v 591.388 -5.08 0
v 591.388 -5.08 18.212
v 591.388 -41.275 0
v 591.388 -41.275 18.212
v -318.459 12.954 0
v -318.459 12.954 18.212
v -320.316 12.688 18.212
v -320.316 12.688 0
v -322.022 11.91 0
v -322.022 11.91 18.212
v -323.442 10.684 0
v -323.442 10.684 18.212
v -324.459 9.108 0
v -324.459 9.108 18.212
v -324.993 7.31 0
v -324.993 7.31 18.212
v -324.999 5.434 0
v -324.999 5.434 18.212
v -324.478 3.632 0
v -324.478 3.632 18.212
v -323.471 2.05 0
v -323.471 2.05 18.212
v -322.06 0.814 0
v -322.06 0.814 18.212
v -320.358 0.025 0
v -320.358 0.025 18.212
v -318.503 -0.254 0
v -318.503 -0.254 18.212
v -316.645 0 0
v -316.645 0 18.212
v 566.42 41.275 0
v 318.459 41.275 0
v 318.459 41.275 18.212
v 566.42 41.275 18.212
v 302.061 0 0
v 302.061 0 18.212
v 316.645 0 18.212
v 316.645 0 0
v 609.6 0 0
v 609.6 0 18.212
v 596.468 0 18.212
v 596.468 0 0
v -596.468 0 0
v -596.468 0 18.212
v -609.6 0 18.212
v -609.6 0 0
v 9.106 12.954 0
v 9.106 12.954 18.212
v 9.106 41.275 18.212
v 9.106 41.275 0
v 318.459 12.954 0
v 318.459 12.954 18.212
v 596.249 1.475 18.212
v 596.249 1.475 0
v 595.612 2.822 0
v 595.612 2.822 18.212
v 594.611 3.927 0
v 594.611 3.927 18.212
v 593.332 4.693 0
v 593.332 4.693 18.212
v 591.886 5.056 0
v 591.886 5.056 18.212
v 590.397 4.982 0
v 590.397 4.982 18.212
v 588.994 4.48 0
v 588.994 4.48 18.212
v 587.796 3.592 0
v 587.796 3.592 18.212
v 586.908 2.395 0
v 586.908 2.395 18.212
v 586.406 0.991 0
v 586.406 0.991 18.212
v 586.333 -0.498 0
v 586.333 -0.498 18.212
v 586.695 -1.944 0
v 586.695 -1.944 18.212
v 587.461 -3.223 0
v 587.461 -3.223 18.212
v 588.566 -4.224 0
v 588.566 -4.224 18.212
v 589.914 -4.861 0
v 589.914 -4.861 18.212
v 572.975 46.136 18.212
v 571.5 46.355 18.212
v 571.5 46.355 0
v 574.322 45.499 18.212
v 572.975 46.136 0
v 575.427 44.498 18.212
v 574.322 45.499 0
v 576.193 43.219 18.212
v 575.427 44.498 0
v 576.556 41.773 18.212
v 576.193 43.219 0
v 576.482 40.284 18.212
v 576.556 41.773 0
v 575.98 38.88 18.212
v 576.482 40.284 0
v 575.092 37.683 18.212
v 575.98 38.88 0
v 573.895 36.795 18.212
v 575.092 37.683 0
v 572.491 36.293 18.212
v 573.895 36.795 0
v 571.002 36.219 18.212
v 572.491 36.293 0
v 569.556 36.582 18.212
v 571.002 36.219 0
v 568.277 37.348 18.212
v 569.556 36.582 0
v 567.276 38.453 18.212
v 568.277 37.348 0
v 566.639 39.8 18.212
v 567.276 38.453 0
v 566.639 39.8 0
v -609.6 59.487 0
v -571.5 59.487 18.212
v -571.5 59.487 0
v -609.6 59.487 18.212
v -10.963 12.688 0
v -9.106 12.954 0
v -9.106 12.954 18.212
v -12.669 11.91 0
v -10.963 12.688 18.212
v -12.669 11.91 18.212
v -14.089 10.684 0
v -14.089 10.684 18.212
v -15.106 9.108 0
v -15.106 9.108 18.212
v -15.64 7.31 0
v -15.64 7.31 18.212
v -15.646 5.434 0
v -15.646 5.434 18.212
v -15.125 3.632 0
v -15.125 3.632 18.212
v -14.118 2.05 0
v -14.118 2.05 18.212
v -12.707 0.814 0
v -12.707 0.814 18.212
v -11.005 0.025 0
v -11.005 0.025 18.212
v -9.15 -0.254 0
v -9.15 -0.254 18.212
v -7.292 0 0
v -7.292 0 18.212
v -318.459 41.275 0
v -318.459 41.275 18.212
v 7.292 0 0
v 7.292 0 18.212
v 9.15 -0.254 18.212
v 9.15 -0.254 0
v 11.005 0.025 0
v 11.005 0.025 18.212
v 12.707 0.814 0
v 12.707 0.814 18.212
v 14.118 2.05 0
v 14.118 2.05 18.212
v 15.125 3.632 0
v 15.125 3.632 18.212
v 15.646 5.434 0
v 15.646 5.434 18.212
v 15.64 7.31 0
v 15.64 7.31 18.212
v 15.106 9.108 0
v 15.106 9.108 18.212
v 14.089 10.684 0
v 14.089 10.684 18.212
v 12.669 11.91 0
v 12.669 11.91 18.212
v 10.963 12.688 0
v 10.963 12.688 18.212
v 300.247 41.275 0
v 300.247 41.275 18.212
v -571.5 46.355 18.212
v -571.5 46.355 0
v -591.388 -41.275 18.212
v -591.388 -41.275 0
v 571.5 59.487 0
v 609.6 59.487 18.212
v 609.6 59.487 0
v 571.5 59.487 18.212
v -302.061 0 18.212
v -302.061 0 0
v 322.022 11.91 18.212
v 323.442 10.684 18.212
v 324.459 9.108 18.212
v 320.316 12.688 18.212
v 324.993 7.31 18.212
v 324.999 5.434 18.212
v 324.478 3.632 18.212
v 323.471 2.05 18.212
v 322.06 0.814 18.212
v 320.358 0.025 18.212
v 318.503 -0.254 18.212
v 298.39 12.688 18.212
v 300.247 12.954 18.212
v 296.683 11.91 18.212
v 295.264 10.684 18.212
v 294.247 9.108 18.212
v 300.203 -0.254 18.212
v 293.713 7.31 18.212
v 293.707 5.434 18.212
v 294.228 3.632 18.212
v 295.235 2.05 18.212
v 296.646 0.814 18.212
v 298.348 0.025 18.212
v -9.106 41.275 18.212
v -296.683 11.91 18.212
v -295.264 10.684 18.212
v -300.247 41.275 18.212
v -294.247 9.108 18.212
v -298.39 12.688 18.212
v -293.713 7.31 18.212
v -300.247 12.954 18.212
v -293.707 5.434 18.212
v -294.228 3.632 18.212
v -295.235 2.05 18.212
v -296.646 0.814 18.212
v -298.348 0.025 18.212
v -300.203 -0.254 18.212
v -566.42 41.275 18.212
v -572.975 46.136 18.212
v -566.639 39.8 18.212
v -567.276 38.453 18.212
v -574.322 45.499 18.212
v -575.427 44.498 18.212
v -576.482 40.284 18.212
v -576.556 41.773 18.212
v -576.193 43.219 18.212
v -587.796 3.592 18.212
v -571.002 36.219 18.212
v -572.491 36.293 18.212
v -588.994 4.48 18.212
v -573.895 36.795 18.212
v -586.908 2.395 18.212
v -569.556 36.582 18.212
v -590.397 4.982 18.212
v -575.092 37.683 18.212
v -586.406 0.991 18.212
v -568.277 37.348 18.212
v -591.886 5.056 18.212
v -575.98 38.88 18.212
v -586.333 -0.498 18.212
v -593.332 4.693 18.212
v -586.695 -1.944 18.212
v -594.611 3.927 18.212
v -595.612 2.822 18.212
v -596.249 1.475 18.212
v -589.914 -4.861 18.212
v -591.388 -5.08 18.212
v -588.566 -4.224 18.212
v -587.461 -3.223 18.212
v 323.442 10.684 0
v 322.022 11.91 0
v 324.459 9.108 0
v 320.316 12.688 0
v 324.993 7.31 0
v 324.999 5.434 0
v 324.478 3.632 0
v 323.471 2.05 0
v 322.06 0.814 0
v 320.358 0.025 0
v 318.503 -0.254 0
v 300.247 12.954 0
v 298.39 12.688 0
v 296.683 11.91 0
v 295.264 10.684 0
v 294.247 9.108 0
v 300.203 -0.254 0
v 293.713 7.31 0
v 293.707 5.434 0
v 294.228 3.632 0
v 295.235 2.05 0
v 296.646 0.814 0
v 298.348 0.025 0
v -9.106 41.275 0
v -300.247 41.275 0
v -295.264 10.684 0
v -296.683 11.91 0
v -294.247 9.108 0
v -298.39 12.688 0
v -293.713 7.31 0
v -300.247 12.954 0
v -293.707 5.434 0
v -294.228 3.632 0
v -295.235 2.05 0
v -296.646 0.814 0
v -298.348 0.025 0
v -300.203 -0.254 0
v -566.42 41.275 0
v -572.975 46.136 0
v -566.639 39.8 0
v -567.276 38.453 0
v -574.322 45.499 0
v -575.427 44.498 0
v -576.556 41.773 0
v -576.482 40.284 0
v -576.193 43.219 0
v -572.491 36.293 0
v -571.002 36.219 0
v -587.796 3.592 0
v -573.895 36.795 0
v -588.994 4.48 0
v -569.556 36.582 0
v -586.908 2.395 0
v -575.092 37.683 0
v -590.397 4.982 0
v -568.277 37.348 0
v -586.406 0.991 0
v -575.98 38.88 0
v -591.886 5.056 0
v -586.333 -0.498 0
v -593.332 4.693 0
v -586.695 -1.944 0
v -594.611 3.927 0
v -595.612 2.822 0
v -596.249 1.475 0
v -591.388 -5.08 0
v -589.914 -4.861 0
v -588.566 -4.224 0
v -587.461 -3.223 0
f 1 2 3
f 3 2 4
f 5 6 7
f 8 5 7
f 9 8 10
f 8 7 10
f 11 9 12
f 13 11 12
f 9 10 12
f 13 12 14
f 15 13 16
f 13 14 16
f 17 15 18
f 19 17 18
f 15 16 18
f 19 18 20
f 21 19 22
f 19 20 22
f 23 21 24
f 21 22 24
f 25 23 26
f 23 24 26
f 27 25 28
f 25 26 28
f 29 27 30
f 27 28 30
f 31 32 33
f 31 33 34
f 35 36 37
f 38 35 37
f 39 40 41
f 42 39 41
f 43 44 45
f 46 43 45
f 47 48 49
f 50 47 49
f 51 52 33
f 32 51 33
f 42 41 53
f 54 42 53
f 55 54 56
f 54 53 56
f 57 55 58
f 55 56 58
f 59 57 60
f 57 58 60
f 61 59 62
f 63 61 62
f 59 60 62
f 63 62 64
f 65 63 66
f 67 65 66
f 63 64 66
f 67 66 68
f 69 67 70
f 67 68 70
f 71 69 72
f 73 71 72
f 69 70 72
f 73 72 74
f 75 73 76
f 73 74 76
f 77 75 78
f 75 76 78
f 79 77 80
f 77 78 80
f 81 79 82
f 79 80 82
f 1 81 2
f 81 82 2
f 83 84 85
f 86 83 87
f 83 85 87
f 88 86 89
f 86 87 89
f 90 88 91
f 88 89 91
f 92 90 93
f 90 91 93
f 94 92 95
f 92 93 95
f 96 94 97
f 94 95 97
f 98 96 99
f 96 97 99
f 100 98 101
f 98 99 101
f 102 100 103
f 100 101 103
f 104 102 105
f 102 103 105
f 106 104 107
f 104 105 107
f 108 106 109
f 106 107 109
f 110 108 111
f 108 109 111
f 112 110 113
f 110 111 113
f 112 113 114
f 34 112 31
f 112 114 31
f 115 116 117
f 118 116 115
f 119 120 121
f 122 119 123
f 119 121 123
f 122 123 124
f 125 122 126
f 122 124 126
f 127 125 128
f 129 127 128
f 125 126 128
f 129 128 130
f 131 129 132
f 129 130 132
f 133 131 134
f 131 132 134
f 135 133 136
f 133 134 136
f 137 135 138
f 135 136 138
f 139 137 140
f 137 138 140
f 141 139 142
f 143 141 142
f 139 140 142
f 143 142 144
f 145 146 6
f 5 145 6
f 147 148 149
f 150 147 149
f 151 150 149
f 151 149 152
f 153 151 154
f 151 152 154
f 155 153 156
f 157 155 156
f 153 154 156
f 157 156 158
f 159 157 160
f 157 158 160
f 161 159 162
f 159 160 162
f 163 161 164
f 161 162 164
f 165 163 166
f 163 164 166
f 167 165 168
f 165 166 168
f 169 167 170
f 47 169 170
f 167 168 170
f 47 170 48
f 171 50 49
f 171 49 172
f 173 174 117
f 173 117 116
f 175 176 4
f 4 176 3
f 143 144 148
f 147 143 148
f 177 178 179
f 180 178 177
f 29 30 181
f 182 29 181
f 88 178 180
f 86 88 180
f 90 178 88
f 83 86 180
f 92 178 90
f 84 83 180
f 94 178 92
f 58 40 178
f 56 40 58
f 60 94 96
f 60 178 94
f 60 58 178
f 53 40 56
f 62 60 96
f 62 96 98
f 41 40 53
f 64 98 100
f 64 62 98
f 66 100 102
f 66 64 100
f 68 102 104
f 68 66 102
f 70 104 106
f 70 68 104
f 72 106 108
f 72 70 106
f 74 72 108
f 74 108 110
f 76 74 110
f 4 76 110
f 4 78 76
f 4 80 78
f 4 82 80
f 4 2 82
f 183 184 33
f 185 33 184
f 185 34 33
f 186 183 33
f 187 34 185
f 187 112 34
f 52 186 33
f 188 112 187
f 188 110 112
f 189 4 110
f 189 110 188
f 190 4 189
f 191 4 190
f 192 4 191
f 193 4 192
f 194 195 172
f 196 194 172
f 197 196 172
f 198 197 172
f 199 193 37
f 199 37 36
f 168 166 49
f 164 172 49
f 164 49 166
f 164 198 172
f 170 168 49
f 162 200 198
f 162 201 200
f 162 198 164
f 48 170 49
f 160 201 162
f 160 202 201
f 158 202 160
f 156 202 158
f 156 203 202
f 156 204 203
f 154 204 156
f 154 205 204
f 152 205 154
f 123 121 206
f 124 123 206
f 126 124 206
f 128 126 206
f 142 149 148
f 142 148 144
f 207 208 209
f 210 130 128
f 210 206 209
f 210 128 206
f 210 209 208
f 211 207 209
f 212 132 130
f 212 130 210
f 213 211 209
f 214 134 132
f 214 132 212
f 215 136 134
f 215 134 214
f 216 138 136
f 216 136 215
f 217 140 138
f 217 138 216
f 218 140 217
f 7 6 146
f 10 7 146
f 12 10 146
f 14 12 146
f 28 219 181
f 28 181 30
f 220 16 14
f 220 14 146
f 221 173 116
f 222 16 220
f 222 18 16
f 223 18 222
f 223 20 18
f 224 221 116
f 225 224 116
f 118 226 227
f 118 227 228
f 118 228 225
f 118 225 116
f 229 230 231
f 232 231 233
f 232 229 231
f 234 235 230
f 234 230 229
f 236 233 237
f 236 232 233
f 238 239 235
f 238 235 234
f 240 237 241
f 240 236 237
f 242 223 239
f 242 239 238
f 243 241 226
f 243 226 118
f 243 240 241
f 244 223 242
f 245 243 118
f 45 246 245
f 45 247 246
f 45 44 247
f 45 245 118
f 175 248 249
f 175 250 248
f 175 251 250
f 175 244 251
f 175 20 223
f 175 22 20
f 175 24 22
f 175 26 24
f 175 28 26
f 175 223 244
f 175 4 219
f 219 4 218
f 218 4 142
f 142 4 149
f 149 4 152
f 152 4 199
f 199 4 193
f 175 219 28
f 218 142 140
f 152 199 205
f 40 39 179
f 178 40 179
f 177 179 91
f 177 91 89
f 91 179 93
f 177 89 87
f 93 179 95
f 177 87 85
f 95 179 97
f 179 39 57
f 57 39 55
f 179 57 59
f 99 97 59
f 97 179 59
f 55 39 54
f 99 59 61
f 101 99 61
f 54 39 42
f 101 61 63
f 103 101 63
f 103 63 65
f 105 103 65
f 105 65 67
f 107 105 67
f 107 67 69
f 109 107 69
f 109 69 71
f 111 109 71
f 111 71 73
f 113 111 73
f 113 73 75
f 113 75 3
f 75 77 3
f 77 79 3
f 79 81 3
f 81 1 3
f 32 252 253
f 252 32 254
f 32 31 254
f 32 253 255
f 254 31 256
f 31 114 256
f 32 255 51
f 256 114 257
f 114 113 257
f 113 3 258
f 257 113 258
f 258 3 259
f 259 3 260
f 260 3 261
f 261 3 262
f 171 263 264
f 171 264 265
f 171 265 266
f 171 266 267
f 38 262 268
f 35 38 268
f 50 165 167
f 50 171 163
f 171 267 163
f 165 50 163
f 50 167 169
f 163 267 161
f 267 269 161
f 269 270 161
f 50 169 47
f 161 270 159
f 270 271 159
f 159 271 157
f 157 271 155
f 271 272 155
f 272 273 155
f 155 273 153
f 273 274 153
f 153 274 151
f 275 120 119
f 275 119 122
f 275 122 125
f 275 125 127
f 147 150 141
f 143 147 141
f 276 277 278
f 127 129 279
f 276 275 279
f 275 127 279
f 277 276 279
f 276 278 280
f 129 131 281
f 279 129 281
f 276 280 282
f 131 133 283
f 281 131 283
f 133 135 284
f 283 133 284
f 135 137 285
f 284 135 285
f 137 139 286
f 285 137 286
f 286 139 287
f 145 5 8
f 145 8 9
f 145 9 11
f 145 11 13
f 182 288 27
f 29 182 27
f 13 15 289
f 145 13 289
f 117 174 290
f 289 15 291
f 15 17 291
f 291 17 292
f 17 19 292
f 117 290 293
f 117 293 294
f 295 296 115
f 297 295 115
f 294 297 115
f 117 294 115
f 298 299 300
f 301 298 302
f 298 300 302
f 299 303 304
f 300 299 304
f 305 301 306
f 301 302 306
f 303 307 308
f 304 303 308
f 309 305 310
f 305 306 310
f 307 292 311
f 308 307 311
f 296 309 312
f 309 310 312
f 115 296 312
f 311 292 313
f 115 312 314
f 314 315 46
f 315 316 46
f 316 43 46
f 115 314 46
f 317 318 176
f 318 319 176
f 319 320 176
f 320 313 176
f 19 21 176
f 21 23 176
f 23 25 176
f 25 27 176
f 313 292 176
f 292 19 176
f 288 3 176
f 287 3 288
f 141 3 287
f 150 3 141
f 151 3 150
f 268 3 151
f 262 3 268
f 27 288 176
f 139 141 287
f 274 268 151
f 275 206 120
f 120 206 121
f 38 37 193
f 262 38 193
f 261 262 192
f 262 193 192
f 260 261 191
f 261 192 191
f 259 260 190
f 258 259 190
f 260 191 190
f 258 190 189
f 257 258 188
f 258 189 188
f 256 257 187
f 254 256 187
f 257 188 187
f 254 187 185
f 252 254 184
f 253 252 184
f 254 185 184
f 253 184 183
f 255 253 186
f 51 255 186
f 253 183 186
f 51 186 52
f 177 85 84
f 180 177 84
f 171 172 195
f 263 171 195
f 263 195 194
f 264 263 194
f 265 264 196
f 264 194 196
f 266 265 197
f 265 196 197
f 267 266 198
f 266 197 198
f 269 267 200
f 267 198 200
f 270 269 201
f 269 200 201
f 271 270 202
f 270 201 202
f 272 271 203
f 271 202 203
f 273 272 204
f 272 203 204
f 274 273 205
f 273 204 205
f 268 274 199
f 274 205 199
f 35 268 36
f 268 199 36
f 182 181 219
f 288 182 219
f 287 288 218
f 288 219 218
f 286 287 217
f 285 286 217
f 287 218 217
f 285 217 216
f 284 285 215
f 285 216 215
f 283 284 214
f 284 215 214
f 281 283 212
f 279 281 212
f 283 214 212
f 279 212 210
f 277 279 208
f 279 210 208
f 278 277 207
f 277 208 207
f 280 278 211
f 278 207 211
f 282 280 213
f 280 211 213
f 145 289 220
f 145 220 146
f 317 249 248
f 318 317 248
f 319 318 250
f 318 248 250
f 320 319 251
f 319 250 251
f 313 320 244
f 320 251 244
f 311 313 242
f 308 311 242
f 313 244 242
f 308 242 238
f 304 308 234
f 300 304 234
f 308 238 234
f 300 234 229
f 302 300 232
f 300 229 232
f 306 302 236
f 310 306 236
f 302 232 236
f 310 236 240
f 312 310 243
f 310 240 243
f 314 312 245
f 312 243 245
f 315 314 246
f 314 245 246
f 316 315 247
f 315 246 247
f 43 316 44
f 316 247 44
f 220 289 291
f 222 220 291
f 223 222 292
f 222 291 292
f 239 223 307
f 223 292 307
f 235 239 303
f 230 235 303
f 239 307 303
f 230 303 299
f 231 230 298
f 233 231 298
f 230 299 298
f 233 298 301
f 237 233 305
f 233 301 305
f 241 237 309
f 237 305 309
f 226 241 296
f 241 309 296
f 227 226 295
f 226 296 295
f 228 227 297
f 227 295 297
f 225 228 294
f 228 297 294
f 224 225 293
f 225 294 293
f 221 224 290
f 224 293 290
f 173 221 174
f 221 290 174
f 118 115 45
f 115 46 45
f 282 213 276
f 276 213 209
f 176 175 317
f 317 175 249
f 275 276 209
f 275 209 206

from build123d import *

# Parameters (mm, degrees)
F1_W      = 1219.2
F1_H      = 82.55
F2_DEPTH  = 18.2118
F4_DEPTH  = 18.2128
F6_DEPTH  = 18.2128
F7_W      = 38.1
F7_H      = 18.2118
F8_DEPTH  = 18.2118
F9_R      = 5.08
F10_DEPTH = 18.2128


# Not quite as in the source:
# - a variable given as a bare number and used for a length is read in inches; the dataset says mm whatever the document's units were


with BuildPart() as f2:
    # F1 (on Top) → F2 (new body)
    with BuildSketch(Plane.XY):
        Rectangle(F1_W, F1_H)
    extrude(amount=F2_DEPTH)

    # F3 (on face) → F4 (cut, through all)
    with BuildSketch(Plane.XY.offset(18.2118)):
        Polygon((-609.6, 0), (-609.6, -41.275), (-591.3882, -41.275), (-591.3882, -5.08), (-591.3882, 0), (-596.4682, 0), align=None)
        with BuildLine():
            Line((-591.3882, 0), (-591.3882, -5.08))
            ThreePointArc((-591.3882, -5.08), (-587.7960975516, 3.5921024484), (-596.4682, 0))
            Line((-596.4682, 0), (-591.3882, 0))
        make_face()
        with BuildLine():
            Line((591.3882, 0), (596.4682, 0))
            ThreePointArc((596.4682, 0), (587.7960975516, 3.5921024484), (591.3882, -5.08))
            Line((591.3882, -5.08), (591.3882, 0))
        make_face()
        Polygon((591.3882, -5.08), (591.3882, -41.275), (609.6, -41.275), (609.6, 0), (596.4682, 0), (591.3882, 0), align=None)
    extrude(amount=-F4_DEPTH, mode=Mode.SUBTRACT)

    # F5 (on face) → F6 (cut, through all)
    with BuildSketch(Plane.XY.offset(18.2118)):
        Polygon((-300.24705, 41.275), (-318.45885, 41.275), (-318.45885, 12.954), (-318.45885, 0), (-316.6449271791, 0), (-302.0609728209, 0), (-300.24705, 0), (-300.24705, 12.954), align=None)
        with BuildLine():
            Line((-318.45885, 0), (-318.45885, 12.954))
            ThreePointArc((-318.45885, 12.954), (-324.9990417403, 5.434189976), (-316.6449271791, 0))
            Line((-316.6449271791, 0), (-318.45885, 0))
        make_face()
        with BuildLine():
            ThreePointArc((-302.0609728209, 0), (-293.7068582597, 5.434189976), (-300.24705, 12.954))
            Line((-300.24705, 12.954), (-300.24705, 0))
            Line((-300.24705, 0), (-302.0609728209, 0))
        make_face()
        Polygon((318.45885, 41.275), (300.24705, 41.275), (300.24705, 12.954), (300.24705, 0), (302.0609728208, 0), (316.6449271792, 0), (318.45885, 0), (318.45885, 12.954), align=None)
        with BuildLine():
            Line((300.24705, 0), (300.24705, 12.954))
            ThreePointArc((300.24705, 12.954), (293.7068582597, 5.434189976), (302.0609728208, 0))
            Line((302.0609728208, 0), (300.24705, 0))
        make_face()
        with BuildLine():
            ThreePointArc((316.6449271792, 0), (324.9990417403, 5.434189976), (318.45885, 12.954))
            Line((318.45885, 12.954), (318.45885, 0))
            Line((318.45885, 0), (316.6449271792, 0))
        make_face()
        Polygon((9.1059, 41.275), (-9.1059, 41.275), (-9.1059, 12.954), (-9.1059, 0), (-7.2919771792, 0), (7.2919771792, 0), (9.1059, 0), (9.1059, 12.954), align=None)
        with BuildLine():
            Line((-9.1059, 0), (-9.1059, 12.954))
            ThreePointArc((-9.1059, 12.954), (-15.6460917403, 5.434189976), (-7.2919771792, 0))
            Line((-7.2919771792, 0), (-9.1059, 0))
        make_face()
        with BuildLine():
            ThreePointArc((7.2919771792, 0), (15.6460917403, 5.434189976), (9.1059, 12.954))
            Line((9.1059, 12.954), (9.1059, 0))
            Line((9.1059, 0), (7.2919771792, 0))
        make_face()
    extrude(amount=-F6_DEPTH, mode=Mode.SUBTRACT)

    # F7 (on face) → F8 (join)
    with BuildSketch(Plane(origin=(0, 41.275, 0), x_dir=(-1, 0, 0), z_dir=(0, 1, 0))):
        with Locations((590.55, 9.1059)):
            Rectangle(F7_W, F7_H)
        with Locations((-590.55, 9.1059)):
            Rectangle(F7_W, F7_H)
    extrude(amount=F8_DEPTH)

    # F9 (on face) → F10 (cut, through all)
    with BuildSketch(Plane(origin=(0, 0, 0), x_dir=(1, 0, 0), z_dir=(0, 0, -1))):
        with Locations((571.5, -41.275)):
            Circle(F9_R)
        with Locations((-571.5, -41.275)):
            Circle(F9_R)
    extrude(amount=-F10_DEPTH, mode=Mode.SUBTRACT)


solid = f2.part
